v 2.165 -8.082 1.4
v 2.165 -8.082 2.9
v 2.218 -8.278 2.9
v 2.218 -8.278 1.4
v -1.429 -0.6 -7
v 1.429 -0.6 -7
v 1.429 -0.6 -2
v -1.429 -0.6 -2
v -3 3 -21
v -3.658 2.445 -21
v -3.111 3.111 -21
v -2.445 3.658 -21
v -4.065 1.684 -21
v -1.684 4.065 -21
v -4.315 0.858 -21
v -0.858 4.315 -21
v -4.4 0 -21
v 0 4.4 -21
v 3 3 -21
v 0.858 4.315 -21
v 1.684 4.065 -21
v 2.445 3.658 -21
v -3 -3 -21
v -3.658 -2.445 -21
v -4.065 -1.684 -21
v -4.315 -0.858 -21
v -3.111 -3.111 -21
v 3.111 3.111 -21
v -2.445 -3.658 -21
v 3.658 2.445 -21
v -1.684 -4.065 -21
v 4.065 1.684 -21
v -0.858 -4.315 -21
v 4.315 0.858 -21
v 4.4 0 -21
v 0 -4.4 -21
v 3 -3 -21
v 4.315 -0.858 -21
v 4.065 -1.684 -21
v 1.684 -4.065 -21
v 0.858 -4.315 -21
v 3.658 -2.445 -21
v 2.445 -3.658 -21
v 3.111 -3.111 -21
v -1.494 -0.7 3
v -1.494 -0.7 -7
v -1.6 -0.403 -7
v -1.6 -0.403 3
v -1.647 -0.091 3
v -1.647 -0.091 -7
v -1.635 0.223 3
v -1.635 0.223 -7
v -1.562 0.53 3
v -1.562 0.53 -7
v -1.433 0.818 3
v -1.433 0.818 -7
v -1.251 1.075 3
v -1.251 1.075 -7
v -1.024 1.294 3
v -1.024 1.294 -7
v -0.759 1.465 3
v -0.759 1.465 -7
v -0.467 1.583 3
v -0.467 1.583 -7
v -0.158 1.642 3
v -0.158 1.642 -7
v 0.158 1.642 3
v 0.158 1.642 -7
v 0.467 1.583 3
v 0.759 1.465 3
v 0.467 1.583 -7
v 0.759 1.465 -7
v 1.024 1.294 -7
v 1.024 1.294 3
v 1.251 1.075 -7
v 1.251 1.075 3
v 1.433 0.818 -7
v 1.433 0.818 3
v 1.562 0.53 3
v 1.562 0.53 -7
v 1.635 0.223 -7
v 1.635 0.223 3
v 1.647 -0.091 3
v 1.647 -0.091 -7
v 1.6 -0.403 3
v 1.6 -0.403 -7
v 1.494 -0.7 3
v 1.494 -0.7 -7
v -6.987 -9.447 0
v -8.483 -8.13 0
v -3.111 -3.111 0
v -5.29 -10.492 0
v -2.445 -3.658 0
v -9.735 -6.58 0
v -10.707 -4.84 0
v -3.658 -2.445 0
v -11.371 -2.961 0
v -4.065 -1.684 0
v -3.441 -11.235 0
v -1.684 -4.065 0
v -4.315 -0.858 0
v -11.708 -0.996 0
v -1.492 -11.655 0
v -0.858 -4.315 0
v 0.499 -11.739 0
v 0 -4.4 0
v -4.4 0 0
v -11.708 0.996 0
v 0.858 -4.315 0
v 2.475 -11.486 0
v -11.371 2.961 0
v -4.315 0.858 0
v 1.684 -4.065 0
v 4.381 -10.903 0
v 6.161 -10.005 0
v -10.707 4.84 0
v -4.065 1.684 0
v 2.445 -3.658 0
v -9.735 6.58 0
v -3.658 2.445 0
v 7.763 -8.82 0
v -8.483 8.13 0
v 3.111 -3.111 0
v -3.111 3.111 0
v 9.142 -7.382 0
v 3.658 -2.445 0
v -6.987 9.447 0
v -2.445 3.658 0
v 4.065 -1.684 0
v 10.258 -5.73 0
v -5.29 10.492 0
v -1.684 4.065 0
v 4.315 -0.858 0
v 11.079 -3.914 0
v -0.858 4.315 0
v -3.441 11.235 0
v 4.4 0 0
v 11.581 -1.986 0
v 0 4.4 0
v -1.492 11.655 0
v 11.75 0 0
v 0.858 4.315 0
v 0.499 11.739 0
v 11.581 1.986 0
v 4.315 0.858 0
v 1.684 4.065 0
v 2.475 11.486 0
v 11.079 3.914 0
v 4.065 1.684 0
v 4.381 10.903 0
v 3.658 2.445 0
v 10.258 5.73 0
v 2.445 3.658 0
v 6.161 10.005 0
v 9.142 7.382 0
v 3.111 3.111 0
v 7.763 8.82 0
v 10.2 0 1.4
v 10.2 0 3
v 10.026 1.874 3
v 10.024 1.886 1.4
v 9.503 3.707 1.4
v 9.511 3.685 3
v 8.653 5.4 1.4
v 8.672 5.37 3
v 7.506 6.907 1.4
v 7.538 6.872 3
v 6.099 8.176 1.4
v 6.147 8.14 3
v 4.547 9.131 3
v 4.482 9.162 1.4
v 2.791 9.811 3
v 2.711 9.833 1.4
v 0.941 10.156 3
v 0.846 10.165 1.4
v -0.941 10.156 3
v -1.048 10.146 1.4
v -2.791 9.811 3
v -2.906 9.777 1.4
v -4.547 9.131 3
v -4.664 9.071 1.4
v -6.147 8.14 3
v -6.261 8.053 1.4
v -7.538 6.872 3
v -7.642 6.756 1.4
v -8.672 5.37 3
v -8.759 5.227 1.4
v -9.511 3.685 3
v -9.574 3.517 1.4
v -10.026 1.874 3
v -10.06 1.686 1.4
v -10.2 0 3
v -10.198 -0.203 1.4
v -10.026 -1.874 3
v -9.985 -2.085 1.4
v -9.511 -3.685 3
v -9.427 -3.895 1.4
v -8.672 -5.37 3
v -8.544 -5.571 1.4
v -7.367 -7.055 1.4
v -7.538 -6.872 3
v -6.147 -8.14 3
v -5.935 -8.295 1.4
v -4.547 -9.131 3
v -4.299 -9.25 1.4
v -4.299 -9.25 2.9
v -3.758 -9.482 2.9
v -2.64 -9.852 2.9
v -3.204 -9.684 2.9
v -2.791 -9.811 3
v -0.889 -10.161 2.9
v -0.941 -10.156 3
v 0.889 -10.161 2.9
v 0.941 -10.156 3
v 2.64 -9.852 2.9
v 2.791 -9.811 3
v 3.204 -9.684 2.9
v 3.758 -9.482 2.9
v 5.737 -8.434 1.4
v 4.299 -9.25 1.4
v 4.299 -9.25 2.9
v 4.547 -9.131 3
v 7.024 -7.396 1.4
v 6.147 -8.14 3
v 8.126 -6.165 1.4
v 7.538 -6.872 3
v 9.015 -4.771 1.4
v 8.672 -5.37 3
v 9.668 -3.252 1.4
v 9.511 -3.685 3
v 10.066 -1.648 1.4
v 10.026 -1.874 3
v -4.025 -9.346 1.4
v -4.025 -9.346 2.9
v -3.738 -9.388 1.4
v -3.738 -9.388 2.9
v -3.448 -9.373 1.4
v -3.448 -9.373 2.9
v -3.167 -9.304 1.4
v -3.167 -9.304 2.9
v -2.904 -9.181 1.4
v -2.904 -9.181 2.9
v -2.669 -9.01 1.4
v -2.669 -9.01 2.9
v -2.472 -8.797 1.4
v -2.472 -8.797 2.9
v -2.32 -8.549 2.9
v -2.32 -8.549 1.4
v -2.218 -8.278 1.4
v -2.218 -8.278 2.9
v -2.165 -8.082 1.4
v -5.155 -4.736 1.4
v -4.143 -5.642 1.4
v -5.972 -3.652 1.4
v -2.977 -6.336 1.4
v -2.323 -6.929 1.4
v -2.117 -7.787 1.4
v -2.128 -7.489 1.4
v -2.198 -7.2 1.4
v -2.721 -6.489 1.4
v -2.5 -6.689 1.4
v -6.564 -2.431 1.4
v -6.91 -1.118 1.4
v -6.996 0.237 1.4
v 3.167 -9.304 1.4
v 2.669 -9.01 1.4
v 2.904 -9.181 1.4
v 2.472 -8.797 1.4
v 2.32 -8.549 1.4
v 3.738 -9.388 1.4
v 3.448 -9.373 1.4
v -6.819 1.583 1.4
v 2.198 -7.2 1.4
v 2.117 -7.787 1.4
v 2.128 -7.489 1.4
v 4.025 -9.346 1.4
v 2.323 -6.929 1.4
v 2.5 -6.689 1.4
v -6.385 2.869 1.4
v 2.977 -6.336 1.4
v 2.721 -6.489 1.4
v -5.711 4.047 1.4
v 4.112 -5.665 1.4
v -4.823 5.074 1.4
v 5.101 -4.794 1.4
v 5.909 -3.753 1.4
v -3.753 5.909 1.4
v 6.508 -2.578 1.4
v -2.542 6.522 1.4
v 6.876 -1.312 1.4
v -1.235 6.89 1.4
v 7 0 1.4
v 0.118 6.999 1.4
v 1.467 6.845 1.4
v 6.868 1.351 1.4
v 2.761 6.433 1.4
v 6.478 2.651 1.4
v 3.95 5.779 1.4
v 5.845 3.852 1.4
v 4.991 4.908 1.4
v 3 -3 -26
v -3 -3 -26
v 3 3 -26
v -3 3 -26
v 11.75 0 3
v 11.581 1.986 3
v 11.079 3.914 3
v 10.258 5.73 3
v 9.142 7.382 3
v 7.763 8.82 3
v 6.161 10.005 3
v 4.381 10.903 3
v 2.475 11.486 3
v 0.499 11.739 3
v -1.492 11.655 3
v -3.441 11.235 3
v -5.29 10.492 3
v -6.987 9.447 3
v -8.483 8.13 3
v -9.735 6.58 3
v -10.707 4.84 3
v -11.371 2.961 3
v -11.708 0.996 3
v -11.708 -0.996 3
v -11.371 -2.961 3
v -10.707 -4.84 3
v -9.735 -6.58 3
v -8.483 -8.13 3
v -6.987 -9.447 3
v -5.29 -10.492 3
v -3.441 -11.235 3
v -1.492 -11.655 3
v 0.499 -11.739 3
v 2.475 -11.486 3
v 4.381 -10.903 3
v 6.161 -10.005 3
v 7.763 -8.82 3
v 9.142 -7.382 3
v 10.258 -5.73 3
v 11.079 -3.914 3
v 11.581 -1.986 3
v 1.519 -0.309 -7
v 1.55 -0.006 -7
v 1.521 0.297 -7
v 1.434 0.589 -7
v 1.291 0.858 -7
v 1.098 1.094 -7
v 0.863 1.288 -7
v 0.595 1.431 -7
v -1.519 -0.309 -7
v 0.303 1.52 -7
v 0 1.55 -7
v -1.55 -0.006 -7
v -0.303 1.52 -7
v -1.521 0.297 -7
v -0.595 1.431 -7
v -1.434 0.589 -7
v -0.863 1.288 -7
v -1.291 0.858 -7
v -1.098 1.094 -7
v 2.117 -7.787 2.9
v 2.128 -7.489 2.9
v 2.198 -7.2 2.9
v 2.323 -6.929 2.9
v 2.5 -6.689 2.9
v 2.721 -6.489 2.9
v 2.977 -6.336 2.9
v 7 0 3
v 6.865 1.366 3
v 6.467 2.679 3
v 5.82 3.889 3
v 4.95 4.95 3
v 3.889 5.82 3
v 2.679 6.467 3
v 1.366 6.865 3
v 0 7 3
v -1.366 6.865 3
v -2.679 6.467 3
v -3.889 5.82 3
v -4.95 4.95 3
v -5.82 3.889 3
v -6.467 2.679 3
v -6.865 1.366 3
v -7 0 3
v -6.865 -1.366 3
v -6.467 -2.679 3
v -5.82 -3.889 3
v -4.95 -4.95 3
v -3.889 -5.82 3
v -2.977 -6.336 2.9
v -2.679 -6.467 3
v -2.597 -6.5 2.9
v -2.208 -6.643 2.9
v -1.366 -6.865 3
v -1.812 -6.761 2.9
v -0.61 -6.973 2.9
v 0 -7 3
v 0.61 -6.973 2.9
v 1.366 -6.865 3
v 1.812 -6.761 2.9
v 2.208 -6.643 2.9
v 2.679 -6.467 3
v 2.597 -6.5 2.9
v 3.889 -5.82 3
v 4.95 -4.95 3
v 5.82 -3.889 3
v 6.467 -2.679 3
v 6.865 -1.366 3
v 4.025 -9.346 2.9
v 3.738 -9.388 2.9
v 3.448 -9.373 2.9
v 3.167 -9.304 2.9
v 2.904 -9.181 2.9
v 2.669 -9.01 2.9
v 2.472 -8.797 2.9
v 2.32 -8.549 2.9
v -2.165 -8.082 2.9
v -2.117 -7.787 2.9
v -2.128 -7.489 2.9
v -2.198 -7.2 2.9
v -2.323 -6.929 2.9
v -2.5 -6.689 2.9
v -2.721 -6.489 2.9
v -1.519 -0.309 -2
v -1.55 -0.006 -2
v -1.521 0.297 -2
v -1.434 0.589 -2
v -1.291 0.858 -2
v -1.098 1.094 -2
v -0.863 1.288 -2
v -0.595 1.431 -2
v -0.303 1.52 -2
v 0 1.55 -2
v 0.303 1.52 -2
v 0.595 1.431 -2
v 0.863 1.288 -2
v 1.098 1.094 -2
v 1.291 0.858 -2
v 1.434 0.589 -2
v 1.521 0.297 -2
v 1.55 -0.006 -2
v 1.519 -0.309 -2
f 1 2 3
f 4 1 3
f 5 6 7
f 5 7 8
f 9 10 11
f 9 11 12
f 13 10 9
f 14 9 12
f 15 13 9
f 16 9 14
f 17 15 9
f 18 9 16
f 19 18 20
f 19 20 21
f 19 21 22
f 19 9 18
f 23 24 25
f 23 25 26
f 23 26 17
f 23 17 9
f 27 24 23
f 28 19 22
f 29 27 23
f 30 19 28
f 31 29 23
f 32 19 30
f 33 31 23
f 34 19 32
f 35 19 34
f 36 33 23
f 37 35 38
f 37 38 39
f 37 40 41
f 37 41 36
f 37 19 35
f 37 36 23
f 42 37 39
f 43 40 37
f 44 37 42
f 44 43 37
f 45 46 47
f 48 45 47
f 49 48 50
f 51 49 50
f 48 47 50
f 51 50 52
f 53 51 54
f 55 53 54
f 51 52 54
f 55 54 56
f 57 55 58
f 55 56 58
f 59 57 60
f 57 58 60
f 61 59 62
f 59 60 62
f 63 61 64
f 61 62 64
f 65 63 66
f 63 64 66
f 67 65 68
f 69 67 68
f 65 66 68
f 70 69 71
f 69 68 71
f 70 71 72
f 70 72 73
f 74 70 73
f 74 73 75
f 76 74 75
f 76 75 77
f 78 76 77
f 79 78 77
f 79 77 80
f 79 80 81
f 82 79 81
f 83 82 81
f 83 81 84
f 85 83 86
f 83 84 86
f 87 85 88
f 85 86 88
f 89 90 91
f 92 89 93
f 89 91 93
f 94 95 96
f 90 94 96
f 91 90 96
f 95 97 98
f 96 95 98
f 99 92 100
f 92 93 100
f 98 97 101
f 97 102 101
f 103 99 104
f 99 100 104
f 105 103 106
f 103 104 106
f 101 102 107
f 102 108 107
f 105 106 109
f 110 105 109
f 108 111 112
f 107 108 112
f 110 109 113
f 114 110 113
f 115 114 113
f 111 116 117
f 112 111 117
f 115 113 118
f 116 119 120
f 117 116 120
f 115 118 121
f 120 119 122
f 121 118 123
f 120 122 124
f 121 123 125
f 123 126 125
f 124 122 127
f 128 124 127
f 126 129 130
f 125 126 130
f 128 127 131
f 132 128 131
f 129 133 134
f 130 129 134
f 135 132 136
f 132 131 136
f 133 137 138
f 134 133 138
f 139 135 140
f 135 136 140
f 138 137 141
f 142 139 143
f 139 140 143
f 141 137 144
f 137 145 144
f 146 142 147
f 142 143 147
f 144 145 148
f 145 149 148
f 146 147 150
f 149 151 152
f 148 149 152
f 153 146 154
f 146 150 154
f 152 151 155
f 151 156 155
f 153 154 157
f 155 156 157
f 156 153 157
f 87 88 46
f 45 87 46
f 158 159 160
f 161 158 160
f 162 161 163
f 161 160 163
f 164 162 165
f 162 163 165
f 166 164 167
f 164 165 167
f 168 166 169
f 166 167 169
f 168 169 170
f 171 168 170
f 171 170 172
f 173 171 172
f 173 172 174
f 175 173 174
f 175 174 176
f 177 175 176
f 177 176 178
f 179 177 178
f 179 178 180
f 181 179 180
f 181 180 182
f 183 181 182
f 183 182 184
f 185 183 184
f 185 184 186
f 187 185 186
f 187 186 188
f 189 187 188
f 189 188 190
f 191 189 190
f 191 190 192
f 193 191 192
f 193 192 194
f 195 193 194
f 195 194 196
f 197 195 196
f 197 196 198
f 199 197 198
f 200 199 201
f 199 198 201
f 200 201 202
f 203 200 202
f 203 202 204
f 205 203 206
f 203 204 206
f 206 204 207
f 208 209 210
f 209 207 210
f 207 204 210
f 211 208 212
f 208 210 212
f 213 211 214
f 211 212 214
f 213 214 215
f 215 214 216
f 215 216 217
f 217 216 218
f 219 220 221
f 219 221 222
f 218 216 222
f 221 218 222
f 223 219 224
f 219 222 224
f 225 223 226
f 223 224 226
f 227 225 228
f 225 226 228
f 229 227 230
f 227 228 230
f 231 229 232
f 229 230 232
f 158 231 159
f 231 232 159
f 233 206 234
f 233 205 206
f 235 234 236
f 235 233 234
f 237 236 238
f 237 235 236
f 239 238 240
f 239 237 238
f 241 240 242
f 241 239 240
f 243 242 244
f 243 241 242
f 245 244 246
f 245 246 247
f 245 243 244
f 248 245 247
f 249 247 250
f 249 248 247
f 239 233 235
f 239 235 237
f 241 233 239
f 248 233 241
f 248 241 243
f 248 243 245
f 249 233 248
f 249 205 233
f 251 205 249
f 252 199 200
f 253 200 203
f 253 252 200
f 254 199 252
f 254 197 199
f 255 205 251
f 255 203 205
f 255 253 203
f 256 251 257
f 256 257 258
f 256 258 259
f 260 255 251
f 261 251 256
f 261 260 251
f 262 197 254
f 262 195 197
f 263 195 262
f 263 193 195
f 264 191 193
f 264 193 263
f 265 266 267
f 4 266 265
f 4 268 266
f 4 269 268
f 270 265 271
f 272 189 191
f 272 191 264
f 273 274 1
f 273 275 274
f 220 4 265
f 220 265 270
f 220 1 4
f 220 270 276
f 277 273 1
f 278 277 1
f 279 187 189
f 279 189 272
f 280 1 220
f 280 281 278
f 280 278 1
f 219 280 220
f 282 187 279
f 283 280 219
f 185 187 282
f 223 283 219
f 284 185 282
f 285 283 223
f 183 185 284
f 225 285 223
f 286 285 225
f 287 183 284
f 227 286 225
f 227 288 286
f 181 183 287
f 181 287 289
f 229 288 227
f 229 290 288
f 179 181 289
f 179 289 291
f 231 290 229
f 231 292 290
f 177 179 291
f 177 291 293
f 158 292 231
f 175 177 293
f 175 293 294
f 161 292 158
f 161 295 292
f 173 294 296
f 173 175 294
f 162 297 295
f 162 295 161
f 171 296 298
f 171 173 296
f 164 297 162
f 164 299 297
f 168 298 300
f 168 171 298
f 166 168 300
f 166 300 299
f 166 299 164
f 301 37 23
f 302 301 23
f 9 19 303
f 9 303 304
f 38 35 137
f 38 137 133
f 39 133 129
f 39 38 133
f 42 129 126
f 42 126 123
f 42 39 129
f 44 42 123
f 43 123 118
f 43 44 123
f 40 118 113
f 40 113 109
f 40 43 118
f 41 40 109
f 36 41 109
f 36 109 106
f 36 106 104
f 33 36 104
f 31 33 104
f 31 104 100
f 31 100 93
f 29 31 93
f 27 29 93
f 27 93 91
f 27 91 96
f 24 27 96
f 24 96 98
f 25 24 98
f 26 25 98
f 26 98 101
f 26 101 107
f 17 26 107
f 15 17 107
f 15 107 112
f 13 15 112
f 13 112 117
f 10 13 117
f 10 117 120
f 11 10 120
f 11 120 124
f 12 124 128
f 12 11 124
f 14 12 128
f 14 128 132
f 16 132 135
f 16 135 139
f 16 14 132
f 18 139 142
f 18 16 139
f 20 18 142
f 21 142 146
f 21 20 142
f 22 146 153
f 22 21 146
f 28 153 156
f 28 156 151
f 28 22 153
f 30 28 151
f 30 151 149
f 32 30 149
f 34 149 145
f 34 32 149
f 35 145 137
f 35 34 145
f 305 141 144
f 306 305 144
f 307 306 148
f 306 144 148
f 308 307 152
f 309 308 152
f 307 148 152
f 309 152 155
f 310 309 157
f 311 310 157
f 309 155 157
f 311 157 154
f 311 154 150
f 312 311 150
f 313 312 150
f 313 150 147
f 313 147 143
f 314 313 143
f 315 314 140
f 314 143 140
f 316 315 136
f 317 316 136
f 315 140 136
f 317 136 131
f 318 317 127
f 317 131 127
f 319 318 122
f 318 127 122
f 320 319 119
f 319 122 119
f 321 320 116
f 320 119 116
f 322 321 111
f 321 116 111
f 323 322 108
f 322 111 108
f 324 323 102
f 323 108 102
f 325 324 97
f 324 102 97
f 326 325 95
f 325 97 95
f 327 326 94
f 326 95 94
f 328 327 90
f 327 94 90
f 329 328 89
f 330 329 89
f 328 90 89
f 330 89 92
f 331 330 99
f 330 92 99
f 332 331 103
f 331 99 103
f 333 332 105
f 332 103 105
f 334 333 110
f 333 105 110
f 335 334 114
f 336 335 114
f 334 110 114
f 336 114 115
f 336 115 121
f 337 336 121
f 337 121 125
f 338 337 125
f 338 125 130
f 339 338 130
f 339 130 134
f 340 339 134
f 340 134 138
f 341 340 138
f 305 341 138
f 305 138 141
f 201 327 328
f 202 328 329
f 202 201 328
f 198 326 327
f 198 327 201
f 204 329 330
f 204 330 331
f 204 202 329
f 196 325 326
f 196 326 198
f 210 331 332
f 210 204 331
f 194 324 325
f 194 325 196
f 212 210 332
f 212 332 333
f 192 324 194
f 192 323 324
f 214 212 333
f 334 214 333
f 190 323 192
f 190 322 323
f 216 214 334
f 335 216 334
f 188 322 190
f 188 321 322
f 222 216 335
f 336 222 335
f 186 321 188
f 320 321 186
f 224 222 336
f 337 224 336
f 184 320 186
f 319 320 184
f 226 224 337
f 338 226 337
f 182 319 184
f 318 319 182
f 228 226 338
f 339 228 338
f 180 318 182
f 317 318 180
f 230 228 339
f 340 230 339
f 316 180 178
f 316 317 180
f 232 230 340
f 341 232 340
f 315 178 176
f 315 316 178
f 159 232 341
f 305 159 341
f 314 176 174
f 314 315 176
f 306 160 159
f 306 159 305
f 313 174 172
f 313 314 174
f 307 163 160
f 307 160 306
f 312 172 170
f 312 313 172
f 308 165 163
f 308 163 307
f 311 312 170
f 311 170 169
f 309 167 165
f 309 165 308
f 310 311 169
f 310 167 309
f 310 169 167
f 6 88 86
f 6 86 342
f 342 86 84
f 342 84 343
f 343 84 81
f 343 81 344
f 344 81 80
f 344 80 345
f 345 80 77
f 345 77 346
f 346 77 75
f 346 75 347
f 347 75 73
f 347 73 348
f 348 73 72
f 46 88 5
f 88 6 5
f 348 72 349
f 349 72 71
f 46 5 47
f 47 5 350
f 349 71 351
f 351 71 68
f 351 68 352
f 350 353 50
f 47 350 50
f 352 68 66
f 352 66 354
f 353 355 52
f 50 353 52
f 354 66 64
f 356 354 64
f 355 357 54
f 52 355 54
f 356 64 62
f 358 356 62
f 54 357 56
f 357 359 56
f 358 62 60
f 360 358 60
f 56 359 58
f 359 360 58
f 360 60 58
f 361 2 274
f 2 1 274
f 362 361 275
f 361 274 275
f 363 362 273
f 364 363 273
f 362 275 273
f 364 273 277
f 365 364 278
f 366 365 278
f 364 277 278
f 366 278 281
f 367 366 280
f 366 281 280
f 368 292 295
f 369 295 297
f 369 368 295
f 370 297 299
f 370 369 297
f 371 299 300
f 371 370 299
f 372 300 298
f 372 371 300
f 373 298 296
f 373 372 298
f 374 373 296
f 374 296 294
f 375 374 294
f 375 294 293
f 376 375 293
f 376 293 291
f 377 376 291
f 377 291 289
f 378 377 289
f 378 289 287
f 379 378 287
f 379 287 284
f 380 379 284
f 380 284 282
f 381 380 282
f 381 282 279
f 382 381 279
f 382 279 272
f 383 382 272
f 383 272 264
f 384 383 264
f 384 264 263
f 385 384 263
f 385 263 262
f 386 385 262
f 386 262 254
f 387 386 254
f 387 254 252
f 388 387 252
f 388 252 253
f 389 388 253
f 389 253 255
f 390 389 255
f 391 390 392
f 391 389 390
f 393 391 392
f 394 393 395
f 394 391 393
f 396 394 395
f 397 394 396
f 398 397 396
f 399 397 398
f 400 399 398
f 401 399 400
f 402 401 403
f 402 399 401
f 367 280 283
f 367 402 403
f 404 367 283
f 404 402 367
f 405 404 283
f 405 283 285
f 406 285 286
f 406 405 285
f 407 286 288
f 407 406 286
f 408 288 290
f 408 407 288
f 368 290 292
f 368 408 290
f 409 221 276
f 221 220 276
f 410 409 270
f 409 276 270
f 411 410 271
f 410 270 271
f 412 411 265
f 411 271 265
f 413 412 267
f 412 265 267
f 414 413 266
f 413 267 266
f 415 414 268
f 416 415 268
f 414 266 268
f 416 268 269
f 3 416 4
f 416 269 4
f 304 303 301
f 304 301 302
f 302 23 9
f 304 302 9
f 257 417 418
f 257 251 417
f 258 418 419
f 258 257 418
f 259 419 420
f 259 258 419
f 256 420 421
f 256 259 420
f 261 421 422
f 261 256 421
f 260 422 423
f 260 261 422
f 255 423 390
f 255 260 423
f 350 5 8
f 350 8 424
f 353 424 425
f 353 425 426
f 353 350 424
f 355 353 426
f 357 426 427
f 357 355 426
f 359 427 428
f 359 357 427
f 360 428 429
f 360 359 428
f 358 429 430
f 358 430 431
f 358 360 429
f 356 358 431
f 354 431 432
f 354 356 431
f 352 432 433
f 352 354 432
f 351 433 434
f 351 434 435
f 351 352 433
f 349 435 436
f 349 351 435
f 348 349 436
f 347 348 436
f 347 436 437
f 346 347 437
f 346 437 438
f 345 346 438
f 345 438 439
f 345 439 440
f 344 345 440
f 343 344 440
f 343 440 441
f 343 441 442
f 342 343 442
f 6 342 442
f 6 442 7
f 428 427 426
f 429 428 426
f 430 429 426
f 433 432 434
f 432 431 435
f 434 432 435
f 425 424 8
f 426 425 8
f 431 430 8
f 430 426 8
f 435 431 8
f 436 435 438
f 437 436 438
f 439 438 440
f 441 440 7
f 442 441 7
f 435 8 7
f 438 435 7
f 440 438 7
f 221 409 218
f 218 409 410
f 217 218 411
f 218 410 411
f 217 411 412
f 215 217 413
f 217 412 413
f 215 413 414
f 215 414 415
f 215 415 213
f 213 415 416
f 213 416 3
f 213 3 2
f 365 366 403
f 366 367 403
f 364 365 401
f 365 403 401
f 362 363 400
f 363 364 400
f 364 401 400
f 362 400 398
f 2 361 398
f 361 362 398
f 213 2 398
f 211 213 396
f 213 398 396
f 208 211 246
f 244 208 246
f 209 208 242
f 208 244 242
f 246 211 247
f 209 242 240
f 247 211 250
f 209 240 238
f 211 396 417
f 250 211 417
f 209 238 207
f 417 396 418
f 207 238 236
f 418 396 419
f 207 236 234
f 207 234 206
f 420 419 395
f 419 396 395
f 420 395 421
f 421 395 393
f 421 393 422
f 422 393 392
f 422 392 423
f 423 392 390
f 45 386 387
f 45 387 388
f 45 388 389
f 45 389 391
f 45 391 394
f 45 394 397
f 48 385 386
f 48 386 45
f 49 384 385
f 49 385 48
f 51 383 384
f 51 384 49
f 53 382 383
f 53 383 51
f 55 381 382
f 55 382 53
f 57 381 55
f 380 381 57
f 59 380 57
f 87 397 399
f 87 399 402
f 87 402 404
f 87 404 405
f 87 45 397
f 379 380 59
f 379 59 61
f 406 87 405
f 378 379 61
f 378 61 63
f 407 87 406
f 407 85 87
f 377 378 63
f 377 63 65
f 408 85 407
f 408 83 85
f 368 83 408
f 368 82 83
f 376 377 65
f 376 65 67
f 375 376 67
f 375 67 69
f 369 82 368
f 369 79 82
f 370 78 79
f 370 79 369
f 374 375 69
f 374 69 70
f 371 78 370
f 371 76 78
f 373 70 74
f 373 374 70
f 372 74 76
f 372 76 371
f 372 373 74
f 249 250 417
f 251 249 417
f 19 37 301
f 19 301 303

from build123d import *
from build123d.topology import SkipClean

# Parameters (mm, degrees)
SKETCH_1_R          = 11.75
EXTRUDE_1_DEPTH     = 3
CUT_EXTRUDE_1_DEPTH = 13
SKETCH_3_R          = 10.2
SKETCH_3_R_2        = 7
CUT_EXTRUDE_2_DEPTH = 1.6
EXTRUDE_START       = 1.5
EXTRUDE_2_DEPTH     = 1.5
FILLET_1_R          = 1.5
EXTRUDE_START_2     = 2
SKETCH_7_R          = 4.4
EXTRUDE_4_DEPTH     = 2
EXTRUDE_START_3     = 19
SKETCH_9_R          = 4.4
EXTRUDE_5_DEPTH     = 19
SKETCH_10_W         = 6
SKETCH_10_H         = 6
EXTRUDE_6_DEPTH     = 5
CUT_EXTRUDE_START   = -10
CUT_EXTRUDE_4_DEPTH = 10


with BuildPart() as part:
    # 草图1 → 凸台-拉伸1 (new body)
    with BuildSketch(Plane.XY):
        Circle(SKETCH_1_R)
    extrude(amount=EXTRUDE_1_DEPTH)

    # 草图2 → 切除-拉伸1 (cut)
    with BuildSketch(Plane(origin=(0, 0, 0), x_dir=(-1, 0, 0), z_dir=(0, 0, -1))):
        with BuildLine():
            Line((1.429160593, -0.6), (-1.429160593, -0.6))
            ThreePointArc((-1.429160593, -0.6), (0, 1.55), (1.429160593, -0.6))
        make_face()
    extrude(amount=-CUT_EXTRUDE_1_DEPTH, mode=Mode.SUBTRACT)

    # 草图3 → 切除-拉伸2 (cut)
    with BuildSketch(Plane.XY.offset(3)):
        Circle(SKETCH_3_R)
        Circle(SKETCH_3_R_2, mode=Mode.SUBTRACT)
    extrude(amount=-CUT_EXTRUDE_2_DEPTH, mode=Mode.SUBTRACT)

    # 草图4 → 凸台-拉伸2 (add)
    with BuildSketch(Plane.XY.offset(1.4).offset(EXTRUDE_START)):
        with BuildLine():
            Line((1.811733316, -6.761480784), (2.63995426, -9.852443428))
            ThreePointArc((2.63995426, -9.852443428), (0, -10.2), (-2.63995426, -9.852443428))
            Line((-2.63995426, -9.852443428), (-1.811733316, -6.761480784))
            ThreePointArc((-1.811733316, -6.761480784), (0, -7), (1.811733316, -6.761480784))
        make_face()
    extrude(amount=-EXTRUDE_2_DEPTH)

    # 圆角1
    fillet_1_edges = [part.edges().sort_by_distance(p)[0] for p in [
        (1.811733316, -6.761480784, 2.15),
        (-1.811733316, -6.761480784, 2.15),
        (-2.63995426, -9.852443428, 2.15),
        (2.63995426, -9.852443428, 2.15),
    ]]
    fillet(fillet_1_edges, radius=FILLET_1_R)

    # 草图7 → 凸台-拉伸4 (add)
    with SkipClean():  # the faces are left unmerged after this step: merging them gives an invalid solid
        with BuildSketch(Plane(origin=(0, 0, 0), x_dir=(-1, 0, 0), z_dir=(0, 0, -1)).offset(EXTRUDE_START_2)):
            with Locations(Location((0, 0, 0), (0, 0, 180))):
                Circle(SKETCH_7_R)
            with BuildLine():
                Line((-1.429160593, -0.6), (1.429160593, -0.6))
                ThreePointArc((1.429160593, -0.6), (0, 1.55), (-1.429160593, -0.6))
            make_face(mode=Mode.SUBTRACT)
        extrude(amount=-EXTRUDE_4_DEPTH)

    # 草图9 → 凸台-拉伸5 (add)
    with SkipClean():  # the faces are left unmerged after this step: merging them gives an invalid solid
        with BuildSketch(Plane(origin=(0, 0, -2), x_dir=(-1, 0, 0), z_dir=(0, 0, -1)).offset(EXTRUDE_START_3)):
            with Locations(Location((0, 0, 0), (0, 0, 180))):
                Circle(SKETCH_9_R)
        extrude(amount=-EXTRUDE_5_DEPTH)

    # 草图10 → 凸台-拉伸6 (add)
    with SkipClean():  # the faces are left unmerged after this step: merging them gives an invalid solid
        with BuildSketch(Plane(origin=(0, 0, -21), x_dir=(-1, 0, 0), z_dir=(0, 0, -1))):
            Rectangle(SKETCH_10_W, SKETCH_10_H)
        extrude(amount=EXTRUDE_6_DEPTH)

    # 草图11 → 切除-拉伸4 (cut)
    with BuildSketch(Plane.XY.offset(3).offset(CUT_EXTRUDE_START)):
        with BuildLine():
            Line((1.49415528, -0.7), (-1.49415528, -0.7))
            ThreePointArc((-1.49415528, -0.7), (0, 1.65), (1.49415528, -0.7))
        make_face()
        with BuildLine():
            Line((1.429160593, -0.6), (-1.429160593, -0.6))
            ThreePointArc((-1.429160593, -0.6), (0, 1.55), (1.429160593, -0.6))
        make_face(mode=Mode.SUBTRACT)
    extrude(amount=CUT_EXTRUDE_4_DEPTH, mode=Mode.SUBTRACT)


solid = part.part
